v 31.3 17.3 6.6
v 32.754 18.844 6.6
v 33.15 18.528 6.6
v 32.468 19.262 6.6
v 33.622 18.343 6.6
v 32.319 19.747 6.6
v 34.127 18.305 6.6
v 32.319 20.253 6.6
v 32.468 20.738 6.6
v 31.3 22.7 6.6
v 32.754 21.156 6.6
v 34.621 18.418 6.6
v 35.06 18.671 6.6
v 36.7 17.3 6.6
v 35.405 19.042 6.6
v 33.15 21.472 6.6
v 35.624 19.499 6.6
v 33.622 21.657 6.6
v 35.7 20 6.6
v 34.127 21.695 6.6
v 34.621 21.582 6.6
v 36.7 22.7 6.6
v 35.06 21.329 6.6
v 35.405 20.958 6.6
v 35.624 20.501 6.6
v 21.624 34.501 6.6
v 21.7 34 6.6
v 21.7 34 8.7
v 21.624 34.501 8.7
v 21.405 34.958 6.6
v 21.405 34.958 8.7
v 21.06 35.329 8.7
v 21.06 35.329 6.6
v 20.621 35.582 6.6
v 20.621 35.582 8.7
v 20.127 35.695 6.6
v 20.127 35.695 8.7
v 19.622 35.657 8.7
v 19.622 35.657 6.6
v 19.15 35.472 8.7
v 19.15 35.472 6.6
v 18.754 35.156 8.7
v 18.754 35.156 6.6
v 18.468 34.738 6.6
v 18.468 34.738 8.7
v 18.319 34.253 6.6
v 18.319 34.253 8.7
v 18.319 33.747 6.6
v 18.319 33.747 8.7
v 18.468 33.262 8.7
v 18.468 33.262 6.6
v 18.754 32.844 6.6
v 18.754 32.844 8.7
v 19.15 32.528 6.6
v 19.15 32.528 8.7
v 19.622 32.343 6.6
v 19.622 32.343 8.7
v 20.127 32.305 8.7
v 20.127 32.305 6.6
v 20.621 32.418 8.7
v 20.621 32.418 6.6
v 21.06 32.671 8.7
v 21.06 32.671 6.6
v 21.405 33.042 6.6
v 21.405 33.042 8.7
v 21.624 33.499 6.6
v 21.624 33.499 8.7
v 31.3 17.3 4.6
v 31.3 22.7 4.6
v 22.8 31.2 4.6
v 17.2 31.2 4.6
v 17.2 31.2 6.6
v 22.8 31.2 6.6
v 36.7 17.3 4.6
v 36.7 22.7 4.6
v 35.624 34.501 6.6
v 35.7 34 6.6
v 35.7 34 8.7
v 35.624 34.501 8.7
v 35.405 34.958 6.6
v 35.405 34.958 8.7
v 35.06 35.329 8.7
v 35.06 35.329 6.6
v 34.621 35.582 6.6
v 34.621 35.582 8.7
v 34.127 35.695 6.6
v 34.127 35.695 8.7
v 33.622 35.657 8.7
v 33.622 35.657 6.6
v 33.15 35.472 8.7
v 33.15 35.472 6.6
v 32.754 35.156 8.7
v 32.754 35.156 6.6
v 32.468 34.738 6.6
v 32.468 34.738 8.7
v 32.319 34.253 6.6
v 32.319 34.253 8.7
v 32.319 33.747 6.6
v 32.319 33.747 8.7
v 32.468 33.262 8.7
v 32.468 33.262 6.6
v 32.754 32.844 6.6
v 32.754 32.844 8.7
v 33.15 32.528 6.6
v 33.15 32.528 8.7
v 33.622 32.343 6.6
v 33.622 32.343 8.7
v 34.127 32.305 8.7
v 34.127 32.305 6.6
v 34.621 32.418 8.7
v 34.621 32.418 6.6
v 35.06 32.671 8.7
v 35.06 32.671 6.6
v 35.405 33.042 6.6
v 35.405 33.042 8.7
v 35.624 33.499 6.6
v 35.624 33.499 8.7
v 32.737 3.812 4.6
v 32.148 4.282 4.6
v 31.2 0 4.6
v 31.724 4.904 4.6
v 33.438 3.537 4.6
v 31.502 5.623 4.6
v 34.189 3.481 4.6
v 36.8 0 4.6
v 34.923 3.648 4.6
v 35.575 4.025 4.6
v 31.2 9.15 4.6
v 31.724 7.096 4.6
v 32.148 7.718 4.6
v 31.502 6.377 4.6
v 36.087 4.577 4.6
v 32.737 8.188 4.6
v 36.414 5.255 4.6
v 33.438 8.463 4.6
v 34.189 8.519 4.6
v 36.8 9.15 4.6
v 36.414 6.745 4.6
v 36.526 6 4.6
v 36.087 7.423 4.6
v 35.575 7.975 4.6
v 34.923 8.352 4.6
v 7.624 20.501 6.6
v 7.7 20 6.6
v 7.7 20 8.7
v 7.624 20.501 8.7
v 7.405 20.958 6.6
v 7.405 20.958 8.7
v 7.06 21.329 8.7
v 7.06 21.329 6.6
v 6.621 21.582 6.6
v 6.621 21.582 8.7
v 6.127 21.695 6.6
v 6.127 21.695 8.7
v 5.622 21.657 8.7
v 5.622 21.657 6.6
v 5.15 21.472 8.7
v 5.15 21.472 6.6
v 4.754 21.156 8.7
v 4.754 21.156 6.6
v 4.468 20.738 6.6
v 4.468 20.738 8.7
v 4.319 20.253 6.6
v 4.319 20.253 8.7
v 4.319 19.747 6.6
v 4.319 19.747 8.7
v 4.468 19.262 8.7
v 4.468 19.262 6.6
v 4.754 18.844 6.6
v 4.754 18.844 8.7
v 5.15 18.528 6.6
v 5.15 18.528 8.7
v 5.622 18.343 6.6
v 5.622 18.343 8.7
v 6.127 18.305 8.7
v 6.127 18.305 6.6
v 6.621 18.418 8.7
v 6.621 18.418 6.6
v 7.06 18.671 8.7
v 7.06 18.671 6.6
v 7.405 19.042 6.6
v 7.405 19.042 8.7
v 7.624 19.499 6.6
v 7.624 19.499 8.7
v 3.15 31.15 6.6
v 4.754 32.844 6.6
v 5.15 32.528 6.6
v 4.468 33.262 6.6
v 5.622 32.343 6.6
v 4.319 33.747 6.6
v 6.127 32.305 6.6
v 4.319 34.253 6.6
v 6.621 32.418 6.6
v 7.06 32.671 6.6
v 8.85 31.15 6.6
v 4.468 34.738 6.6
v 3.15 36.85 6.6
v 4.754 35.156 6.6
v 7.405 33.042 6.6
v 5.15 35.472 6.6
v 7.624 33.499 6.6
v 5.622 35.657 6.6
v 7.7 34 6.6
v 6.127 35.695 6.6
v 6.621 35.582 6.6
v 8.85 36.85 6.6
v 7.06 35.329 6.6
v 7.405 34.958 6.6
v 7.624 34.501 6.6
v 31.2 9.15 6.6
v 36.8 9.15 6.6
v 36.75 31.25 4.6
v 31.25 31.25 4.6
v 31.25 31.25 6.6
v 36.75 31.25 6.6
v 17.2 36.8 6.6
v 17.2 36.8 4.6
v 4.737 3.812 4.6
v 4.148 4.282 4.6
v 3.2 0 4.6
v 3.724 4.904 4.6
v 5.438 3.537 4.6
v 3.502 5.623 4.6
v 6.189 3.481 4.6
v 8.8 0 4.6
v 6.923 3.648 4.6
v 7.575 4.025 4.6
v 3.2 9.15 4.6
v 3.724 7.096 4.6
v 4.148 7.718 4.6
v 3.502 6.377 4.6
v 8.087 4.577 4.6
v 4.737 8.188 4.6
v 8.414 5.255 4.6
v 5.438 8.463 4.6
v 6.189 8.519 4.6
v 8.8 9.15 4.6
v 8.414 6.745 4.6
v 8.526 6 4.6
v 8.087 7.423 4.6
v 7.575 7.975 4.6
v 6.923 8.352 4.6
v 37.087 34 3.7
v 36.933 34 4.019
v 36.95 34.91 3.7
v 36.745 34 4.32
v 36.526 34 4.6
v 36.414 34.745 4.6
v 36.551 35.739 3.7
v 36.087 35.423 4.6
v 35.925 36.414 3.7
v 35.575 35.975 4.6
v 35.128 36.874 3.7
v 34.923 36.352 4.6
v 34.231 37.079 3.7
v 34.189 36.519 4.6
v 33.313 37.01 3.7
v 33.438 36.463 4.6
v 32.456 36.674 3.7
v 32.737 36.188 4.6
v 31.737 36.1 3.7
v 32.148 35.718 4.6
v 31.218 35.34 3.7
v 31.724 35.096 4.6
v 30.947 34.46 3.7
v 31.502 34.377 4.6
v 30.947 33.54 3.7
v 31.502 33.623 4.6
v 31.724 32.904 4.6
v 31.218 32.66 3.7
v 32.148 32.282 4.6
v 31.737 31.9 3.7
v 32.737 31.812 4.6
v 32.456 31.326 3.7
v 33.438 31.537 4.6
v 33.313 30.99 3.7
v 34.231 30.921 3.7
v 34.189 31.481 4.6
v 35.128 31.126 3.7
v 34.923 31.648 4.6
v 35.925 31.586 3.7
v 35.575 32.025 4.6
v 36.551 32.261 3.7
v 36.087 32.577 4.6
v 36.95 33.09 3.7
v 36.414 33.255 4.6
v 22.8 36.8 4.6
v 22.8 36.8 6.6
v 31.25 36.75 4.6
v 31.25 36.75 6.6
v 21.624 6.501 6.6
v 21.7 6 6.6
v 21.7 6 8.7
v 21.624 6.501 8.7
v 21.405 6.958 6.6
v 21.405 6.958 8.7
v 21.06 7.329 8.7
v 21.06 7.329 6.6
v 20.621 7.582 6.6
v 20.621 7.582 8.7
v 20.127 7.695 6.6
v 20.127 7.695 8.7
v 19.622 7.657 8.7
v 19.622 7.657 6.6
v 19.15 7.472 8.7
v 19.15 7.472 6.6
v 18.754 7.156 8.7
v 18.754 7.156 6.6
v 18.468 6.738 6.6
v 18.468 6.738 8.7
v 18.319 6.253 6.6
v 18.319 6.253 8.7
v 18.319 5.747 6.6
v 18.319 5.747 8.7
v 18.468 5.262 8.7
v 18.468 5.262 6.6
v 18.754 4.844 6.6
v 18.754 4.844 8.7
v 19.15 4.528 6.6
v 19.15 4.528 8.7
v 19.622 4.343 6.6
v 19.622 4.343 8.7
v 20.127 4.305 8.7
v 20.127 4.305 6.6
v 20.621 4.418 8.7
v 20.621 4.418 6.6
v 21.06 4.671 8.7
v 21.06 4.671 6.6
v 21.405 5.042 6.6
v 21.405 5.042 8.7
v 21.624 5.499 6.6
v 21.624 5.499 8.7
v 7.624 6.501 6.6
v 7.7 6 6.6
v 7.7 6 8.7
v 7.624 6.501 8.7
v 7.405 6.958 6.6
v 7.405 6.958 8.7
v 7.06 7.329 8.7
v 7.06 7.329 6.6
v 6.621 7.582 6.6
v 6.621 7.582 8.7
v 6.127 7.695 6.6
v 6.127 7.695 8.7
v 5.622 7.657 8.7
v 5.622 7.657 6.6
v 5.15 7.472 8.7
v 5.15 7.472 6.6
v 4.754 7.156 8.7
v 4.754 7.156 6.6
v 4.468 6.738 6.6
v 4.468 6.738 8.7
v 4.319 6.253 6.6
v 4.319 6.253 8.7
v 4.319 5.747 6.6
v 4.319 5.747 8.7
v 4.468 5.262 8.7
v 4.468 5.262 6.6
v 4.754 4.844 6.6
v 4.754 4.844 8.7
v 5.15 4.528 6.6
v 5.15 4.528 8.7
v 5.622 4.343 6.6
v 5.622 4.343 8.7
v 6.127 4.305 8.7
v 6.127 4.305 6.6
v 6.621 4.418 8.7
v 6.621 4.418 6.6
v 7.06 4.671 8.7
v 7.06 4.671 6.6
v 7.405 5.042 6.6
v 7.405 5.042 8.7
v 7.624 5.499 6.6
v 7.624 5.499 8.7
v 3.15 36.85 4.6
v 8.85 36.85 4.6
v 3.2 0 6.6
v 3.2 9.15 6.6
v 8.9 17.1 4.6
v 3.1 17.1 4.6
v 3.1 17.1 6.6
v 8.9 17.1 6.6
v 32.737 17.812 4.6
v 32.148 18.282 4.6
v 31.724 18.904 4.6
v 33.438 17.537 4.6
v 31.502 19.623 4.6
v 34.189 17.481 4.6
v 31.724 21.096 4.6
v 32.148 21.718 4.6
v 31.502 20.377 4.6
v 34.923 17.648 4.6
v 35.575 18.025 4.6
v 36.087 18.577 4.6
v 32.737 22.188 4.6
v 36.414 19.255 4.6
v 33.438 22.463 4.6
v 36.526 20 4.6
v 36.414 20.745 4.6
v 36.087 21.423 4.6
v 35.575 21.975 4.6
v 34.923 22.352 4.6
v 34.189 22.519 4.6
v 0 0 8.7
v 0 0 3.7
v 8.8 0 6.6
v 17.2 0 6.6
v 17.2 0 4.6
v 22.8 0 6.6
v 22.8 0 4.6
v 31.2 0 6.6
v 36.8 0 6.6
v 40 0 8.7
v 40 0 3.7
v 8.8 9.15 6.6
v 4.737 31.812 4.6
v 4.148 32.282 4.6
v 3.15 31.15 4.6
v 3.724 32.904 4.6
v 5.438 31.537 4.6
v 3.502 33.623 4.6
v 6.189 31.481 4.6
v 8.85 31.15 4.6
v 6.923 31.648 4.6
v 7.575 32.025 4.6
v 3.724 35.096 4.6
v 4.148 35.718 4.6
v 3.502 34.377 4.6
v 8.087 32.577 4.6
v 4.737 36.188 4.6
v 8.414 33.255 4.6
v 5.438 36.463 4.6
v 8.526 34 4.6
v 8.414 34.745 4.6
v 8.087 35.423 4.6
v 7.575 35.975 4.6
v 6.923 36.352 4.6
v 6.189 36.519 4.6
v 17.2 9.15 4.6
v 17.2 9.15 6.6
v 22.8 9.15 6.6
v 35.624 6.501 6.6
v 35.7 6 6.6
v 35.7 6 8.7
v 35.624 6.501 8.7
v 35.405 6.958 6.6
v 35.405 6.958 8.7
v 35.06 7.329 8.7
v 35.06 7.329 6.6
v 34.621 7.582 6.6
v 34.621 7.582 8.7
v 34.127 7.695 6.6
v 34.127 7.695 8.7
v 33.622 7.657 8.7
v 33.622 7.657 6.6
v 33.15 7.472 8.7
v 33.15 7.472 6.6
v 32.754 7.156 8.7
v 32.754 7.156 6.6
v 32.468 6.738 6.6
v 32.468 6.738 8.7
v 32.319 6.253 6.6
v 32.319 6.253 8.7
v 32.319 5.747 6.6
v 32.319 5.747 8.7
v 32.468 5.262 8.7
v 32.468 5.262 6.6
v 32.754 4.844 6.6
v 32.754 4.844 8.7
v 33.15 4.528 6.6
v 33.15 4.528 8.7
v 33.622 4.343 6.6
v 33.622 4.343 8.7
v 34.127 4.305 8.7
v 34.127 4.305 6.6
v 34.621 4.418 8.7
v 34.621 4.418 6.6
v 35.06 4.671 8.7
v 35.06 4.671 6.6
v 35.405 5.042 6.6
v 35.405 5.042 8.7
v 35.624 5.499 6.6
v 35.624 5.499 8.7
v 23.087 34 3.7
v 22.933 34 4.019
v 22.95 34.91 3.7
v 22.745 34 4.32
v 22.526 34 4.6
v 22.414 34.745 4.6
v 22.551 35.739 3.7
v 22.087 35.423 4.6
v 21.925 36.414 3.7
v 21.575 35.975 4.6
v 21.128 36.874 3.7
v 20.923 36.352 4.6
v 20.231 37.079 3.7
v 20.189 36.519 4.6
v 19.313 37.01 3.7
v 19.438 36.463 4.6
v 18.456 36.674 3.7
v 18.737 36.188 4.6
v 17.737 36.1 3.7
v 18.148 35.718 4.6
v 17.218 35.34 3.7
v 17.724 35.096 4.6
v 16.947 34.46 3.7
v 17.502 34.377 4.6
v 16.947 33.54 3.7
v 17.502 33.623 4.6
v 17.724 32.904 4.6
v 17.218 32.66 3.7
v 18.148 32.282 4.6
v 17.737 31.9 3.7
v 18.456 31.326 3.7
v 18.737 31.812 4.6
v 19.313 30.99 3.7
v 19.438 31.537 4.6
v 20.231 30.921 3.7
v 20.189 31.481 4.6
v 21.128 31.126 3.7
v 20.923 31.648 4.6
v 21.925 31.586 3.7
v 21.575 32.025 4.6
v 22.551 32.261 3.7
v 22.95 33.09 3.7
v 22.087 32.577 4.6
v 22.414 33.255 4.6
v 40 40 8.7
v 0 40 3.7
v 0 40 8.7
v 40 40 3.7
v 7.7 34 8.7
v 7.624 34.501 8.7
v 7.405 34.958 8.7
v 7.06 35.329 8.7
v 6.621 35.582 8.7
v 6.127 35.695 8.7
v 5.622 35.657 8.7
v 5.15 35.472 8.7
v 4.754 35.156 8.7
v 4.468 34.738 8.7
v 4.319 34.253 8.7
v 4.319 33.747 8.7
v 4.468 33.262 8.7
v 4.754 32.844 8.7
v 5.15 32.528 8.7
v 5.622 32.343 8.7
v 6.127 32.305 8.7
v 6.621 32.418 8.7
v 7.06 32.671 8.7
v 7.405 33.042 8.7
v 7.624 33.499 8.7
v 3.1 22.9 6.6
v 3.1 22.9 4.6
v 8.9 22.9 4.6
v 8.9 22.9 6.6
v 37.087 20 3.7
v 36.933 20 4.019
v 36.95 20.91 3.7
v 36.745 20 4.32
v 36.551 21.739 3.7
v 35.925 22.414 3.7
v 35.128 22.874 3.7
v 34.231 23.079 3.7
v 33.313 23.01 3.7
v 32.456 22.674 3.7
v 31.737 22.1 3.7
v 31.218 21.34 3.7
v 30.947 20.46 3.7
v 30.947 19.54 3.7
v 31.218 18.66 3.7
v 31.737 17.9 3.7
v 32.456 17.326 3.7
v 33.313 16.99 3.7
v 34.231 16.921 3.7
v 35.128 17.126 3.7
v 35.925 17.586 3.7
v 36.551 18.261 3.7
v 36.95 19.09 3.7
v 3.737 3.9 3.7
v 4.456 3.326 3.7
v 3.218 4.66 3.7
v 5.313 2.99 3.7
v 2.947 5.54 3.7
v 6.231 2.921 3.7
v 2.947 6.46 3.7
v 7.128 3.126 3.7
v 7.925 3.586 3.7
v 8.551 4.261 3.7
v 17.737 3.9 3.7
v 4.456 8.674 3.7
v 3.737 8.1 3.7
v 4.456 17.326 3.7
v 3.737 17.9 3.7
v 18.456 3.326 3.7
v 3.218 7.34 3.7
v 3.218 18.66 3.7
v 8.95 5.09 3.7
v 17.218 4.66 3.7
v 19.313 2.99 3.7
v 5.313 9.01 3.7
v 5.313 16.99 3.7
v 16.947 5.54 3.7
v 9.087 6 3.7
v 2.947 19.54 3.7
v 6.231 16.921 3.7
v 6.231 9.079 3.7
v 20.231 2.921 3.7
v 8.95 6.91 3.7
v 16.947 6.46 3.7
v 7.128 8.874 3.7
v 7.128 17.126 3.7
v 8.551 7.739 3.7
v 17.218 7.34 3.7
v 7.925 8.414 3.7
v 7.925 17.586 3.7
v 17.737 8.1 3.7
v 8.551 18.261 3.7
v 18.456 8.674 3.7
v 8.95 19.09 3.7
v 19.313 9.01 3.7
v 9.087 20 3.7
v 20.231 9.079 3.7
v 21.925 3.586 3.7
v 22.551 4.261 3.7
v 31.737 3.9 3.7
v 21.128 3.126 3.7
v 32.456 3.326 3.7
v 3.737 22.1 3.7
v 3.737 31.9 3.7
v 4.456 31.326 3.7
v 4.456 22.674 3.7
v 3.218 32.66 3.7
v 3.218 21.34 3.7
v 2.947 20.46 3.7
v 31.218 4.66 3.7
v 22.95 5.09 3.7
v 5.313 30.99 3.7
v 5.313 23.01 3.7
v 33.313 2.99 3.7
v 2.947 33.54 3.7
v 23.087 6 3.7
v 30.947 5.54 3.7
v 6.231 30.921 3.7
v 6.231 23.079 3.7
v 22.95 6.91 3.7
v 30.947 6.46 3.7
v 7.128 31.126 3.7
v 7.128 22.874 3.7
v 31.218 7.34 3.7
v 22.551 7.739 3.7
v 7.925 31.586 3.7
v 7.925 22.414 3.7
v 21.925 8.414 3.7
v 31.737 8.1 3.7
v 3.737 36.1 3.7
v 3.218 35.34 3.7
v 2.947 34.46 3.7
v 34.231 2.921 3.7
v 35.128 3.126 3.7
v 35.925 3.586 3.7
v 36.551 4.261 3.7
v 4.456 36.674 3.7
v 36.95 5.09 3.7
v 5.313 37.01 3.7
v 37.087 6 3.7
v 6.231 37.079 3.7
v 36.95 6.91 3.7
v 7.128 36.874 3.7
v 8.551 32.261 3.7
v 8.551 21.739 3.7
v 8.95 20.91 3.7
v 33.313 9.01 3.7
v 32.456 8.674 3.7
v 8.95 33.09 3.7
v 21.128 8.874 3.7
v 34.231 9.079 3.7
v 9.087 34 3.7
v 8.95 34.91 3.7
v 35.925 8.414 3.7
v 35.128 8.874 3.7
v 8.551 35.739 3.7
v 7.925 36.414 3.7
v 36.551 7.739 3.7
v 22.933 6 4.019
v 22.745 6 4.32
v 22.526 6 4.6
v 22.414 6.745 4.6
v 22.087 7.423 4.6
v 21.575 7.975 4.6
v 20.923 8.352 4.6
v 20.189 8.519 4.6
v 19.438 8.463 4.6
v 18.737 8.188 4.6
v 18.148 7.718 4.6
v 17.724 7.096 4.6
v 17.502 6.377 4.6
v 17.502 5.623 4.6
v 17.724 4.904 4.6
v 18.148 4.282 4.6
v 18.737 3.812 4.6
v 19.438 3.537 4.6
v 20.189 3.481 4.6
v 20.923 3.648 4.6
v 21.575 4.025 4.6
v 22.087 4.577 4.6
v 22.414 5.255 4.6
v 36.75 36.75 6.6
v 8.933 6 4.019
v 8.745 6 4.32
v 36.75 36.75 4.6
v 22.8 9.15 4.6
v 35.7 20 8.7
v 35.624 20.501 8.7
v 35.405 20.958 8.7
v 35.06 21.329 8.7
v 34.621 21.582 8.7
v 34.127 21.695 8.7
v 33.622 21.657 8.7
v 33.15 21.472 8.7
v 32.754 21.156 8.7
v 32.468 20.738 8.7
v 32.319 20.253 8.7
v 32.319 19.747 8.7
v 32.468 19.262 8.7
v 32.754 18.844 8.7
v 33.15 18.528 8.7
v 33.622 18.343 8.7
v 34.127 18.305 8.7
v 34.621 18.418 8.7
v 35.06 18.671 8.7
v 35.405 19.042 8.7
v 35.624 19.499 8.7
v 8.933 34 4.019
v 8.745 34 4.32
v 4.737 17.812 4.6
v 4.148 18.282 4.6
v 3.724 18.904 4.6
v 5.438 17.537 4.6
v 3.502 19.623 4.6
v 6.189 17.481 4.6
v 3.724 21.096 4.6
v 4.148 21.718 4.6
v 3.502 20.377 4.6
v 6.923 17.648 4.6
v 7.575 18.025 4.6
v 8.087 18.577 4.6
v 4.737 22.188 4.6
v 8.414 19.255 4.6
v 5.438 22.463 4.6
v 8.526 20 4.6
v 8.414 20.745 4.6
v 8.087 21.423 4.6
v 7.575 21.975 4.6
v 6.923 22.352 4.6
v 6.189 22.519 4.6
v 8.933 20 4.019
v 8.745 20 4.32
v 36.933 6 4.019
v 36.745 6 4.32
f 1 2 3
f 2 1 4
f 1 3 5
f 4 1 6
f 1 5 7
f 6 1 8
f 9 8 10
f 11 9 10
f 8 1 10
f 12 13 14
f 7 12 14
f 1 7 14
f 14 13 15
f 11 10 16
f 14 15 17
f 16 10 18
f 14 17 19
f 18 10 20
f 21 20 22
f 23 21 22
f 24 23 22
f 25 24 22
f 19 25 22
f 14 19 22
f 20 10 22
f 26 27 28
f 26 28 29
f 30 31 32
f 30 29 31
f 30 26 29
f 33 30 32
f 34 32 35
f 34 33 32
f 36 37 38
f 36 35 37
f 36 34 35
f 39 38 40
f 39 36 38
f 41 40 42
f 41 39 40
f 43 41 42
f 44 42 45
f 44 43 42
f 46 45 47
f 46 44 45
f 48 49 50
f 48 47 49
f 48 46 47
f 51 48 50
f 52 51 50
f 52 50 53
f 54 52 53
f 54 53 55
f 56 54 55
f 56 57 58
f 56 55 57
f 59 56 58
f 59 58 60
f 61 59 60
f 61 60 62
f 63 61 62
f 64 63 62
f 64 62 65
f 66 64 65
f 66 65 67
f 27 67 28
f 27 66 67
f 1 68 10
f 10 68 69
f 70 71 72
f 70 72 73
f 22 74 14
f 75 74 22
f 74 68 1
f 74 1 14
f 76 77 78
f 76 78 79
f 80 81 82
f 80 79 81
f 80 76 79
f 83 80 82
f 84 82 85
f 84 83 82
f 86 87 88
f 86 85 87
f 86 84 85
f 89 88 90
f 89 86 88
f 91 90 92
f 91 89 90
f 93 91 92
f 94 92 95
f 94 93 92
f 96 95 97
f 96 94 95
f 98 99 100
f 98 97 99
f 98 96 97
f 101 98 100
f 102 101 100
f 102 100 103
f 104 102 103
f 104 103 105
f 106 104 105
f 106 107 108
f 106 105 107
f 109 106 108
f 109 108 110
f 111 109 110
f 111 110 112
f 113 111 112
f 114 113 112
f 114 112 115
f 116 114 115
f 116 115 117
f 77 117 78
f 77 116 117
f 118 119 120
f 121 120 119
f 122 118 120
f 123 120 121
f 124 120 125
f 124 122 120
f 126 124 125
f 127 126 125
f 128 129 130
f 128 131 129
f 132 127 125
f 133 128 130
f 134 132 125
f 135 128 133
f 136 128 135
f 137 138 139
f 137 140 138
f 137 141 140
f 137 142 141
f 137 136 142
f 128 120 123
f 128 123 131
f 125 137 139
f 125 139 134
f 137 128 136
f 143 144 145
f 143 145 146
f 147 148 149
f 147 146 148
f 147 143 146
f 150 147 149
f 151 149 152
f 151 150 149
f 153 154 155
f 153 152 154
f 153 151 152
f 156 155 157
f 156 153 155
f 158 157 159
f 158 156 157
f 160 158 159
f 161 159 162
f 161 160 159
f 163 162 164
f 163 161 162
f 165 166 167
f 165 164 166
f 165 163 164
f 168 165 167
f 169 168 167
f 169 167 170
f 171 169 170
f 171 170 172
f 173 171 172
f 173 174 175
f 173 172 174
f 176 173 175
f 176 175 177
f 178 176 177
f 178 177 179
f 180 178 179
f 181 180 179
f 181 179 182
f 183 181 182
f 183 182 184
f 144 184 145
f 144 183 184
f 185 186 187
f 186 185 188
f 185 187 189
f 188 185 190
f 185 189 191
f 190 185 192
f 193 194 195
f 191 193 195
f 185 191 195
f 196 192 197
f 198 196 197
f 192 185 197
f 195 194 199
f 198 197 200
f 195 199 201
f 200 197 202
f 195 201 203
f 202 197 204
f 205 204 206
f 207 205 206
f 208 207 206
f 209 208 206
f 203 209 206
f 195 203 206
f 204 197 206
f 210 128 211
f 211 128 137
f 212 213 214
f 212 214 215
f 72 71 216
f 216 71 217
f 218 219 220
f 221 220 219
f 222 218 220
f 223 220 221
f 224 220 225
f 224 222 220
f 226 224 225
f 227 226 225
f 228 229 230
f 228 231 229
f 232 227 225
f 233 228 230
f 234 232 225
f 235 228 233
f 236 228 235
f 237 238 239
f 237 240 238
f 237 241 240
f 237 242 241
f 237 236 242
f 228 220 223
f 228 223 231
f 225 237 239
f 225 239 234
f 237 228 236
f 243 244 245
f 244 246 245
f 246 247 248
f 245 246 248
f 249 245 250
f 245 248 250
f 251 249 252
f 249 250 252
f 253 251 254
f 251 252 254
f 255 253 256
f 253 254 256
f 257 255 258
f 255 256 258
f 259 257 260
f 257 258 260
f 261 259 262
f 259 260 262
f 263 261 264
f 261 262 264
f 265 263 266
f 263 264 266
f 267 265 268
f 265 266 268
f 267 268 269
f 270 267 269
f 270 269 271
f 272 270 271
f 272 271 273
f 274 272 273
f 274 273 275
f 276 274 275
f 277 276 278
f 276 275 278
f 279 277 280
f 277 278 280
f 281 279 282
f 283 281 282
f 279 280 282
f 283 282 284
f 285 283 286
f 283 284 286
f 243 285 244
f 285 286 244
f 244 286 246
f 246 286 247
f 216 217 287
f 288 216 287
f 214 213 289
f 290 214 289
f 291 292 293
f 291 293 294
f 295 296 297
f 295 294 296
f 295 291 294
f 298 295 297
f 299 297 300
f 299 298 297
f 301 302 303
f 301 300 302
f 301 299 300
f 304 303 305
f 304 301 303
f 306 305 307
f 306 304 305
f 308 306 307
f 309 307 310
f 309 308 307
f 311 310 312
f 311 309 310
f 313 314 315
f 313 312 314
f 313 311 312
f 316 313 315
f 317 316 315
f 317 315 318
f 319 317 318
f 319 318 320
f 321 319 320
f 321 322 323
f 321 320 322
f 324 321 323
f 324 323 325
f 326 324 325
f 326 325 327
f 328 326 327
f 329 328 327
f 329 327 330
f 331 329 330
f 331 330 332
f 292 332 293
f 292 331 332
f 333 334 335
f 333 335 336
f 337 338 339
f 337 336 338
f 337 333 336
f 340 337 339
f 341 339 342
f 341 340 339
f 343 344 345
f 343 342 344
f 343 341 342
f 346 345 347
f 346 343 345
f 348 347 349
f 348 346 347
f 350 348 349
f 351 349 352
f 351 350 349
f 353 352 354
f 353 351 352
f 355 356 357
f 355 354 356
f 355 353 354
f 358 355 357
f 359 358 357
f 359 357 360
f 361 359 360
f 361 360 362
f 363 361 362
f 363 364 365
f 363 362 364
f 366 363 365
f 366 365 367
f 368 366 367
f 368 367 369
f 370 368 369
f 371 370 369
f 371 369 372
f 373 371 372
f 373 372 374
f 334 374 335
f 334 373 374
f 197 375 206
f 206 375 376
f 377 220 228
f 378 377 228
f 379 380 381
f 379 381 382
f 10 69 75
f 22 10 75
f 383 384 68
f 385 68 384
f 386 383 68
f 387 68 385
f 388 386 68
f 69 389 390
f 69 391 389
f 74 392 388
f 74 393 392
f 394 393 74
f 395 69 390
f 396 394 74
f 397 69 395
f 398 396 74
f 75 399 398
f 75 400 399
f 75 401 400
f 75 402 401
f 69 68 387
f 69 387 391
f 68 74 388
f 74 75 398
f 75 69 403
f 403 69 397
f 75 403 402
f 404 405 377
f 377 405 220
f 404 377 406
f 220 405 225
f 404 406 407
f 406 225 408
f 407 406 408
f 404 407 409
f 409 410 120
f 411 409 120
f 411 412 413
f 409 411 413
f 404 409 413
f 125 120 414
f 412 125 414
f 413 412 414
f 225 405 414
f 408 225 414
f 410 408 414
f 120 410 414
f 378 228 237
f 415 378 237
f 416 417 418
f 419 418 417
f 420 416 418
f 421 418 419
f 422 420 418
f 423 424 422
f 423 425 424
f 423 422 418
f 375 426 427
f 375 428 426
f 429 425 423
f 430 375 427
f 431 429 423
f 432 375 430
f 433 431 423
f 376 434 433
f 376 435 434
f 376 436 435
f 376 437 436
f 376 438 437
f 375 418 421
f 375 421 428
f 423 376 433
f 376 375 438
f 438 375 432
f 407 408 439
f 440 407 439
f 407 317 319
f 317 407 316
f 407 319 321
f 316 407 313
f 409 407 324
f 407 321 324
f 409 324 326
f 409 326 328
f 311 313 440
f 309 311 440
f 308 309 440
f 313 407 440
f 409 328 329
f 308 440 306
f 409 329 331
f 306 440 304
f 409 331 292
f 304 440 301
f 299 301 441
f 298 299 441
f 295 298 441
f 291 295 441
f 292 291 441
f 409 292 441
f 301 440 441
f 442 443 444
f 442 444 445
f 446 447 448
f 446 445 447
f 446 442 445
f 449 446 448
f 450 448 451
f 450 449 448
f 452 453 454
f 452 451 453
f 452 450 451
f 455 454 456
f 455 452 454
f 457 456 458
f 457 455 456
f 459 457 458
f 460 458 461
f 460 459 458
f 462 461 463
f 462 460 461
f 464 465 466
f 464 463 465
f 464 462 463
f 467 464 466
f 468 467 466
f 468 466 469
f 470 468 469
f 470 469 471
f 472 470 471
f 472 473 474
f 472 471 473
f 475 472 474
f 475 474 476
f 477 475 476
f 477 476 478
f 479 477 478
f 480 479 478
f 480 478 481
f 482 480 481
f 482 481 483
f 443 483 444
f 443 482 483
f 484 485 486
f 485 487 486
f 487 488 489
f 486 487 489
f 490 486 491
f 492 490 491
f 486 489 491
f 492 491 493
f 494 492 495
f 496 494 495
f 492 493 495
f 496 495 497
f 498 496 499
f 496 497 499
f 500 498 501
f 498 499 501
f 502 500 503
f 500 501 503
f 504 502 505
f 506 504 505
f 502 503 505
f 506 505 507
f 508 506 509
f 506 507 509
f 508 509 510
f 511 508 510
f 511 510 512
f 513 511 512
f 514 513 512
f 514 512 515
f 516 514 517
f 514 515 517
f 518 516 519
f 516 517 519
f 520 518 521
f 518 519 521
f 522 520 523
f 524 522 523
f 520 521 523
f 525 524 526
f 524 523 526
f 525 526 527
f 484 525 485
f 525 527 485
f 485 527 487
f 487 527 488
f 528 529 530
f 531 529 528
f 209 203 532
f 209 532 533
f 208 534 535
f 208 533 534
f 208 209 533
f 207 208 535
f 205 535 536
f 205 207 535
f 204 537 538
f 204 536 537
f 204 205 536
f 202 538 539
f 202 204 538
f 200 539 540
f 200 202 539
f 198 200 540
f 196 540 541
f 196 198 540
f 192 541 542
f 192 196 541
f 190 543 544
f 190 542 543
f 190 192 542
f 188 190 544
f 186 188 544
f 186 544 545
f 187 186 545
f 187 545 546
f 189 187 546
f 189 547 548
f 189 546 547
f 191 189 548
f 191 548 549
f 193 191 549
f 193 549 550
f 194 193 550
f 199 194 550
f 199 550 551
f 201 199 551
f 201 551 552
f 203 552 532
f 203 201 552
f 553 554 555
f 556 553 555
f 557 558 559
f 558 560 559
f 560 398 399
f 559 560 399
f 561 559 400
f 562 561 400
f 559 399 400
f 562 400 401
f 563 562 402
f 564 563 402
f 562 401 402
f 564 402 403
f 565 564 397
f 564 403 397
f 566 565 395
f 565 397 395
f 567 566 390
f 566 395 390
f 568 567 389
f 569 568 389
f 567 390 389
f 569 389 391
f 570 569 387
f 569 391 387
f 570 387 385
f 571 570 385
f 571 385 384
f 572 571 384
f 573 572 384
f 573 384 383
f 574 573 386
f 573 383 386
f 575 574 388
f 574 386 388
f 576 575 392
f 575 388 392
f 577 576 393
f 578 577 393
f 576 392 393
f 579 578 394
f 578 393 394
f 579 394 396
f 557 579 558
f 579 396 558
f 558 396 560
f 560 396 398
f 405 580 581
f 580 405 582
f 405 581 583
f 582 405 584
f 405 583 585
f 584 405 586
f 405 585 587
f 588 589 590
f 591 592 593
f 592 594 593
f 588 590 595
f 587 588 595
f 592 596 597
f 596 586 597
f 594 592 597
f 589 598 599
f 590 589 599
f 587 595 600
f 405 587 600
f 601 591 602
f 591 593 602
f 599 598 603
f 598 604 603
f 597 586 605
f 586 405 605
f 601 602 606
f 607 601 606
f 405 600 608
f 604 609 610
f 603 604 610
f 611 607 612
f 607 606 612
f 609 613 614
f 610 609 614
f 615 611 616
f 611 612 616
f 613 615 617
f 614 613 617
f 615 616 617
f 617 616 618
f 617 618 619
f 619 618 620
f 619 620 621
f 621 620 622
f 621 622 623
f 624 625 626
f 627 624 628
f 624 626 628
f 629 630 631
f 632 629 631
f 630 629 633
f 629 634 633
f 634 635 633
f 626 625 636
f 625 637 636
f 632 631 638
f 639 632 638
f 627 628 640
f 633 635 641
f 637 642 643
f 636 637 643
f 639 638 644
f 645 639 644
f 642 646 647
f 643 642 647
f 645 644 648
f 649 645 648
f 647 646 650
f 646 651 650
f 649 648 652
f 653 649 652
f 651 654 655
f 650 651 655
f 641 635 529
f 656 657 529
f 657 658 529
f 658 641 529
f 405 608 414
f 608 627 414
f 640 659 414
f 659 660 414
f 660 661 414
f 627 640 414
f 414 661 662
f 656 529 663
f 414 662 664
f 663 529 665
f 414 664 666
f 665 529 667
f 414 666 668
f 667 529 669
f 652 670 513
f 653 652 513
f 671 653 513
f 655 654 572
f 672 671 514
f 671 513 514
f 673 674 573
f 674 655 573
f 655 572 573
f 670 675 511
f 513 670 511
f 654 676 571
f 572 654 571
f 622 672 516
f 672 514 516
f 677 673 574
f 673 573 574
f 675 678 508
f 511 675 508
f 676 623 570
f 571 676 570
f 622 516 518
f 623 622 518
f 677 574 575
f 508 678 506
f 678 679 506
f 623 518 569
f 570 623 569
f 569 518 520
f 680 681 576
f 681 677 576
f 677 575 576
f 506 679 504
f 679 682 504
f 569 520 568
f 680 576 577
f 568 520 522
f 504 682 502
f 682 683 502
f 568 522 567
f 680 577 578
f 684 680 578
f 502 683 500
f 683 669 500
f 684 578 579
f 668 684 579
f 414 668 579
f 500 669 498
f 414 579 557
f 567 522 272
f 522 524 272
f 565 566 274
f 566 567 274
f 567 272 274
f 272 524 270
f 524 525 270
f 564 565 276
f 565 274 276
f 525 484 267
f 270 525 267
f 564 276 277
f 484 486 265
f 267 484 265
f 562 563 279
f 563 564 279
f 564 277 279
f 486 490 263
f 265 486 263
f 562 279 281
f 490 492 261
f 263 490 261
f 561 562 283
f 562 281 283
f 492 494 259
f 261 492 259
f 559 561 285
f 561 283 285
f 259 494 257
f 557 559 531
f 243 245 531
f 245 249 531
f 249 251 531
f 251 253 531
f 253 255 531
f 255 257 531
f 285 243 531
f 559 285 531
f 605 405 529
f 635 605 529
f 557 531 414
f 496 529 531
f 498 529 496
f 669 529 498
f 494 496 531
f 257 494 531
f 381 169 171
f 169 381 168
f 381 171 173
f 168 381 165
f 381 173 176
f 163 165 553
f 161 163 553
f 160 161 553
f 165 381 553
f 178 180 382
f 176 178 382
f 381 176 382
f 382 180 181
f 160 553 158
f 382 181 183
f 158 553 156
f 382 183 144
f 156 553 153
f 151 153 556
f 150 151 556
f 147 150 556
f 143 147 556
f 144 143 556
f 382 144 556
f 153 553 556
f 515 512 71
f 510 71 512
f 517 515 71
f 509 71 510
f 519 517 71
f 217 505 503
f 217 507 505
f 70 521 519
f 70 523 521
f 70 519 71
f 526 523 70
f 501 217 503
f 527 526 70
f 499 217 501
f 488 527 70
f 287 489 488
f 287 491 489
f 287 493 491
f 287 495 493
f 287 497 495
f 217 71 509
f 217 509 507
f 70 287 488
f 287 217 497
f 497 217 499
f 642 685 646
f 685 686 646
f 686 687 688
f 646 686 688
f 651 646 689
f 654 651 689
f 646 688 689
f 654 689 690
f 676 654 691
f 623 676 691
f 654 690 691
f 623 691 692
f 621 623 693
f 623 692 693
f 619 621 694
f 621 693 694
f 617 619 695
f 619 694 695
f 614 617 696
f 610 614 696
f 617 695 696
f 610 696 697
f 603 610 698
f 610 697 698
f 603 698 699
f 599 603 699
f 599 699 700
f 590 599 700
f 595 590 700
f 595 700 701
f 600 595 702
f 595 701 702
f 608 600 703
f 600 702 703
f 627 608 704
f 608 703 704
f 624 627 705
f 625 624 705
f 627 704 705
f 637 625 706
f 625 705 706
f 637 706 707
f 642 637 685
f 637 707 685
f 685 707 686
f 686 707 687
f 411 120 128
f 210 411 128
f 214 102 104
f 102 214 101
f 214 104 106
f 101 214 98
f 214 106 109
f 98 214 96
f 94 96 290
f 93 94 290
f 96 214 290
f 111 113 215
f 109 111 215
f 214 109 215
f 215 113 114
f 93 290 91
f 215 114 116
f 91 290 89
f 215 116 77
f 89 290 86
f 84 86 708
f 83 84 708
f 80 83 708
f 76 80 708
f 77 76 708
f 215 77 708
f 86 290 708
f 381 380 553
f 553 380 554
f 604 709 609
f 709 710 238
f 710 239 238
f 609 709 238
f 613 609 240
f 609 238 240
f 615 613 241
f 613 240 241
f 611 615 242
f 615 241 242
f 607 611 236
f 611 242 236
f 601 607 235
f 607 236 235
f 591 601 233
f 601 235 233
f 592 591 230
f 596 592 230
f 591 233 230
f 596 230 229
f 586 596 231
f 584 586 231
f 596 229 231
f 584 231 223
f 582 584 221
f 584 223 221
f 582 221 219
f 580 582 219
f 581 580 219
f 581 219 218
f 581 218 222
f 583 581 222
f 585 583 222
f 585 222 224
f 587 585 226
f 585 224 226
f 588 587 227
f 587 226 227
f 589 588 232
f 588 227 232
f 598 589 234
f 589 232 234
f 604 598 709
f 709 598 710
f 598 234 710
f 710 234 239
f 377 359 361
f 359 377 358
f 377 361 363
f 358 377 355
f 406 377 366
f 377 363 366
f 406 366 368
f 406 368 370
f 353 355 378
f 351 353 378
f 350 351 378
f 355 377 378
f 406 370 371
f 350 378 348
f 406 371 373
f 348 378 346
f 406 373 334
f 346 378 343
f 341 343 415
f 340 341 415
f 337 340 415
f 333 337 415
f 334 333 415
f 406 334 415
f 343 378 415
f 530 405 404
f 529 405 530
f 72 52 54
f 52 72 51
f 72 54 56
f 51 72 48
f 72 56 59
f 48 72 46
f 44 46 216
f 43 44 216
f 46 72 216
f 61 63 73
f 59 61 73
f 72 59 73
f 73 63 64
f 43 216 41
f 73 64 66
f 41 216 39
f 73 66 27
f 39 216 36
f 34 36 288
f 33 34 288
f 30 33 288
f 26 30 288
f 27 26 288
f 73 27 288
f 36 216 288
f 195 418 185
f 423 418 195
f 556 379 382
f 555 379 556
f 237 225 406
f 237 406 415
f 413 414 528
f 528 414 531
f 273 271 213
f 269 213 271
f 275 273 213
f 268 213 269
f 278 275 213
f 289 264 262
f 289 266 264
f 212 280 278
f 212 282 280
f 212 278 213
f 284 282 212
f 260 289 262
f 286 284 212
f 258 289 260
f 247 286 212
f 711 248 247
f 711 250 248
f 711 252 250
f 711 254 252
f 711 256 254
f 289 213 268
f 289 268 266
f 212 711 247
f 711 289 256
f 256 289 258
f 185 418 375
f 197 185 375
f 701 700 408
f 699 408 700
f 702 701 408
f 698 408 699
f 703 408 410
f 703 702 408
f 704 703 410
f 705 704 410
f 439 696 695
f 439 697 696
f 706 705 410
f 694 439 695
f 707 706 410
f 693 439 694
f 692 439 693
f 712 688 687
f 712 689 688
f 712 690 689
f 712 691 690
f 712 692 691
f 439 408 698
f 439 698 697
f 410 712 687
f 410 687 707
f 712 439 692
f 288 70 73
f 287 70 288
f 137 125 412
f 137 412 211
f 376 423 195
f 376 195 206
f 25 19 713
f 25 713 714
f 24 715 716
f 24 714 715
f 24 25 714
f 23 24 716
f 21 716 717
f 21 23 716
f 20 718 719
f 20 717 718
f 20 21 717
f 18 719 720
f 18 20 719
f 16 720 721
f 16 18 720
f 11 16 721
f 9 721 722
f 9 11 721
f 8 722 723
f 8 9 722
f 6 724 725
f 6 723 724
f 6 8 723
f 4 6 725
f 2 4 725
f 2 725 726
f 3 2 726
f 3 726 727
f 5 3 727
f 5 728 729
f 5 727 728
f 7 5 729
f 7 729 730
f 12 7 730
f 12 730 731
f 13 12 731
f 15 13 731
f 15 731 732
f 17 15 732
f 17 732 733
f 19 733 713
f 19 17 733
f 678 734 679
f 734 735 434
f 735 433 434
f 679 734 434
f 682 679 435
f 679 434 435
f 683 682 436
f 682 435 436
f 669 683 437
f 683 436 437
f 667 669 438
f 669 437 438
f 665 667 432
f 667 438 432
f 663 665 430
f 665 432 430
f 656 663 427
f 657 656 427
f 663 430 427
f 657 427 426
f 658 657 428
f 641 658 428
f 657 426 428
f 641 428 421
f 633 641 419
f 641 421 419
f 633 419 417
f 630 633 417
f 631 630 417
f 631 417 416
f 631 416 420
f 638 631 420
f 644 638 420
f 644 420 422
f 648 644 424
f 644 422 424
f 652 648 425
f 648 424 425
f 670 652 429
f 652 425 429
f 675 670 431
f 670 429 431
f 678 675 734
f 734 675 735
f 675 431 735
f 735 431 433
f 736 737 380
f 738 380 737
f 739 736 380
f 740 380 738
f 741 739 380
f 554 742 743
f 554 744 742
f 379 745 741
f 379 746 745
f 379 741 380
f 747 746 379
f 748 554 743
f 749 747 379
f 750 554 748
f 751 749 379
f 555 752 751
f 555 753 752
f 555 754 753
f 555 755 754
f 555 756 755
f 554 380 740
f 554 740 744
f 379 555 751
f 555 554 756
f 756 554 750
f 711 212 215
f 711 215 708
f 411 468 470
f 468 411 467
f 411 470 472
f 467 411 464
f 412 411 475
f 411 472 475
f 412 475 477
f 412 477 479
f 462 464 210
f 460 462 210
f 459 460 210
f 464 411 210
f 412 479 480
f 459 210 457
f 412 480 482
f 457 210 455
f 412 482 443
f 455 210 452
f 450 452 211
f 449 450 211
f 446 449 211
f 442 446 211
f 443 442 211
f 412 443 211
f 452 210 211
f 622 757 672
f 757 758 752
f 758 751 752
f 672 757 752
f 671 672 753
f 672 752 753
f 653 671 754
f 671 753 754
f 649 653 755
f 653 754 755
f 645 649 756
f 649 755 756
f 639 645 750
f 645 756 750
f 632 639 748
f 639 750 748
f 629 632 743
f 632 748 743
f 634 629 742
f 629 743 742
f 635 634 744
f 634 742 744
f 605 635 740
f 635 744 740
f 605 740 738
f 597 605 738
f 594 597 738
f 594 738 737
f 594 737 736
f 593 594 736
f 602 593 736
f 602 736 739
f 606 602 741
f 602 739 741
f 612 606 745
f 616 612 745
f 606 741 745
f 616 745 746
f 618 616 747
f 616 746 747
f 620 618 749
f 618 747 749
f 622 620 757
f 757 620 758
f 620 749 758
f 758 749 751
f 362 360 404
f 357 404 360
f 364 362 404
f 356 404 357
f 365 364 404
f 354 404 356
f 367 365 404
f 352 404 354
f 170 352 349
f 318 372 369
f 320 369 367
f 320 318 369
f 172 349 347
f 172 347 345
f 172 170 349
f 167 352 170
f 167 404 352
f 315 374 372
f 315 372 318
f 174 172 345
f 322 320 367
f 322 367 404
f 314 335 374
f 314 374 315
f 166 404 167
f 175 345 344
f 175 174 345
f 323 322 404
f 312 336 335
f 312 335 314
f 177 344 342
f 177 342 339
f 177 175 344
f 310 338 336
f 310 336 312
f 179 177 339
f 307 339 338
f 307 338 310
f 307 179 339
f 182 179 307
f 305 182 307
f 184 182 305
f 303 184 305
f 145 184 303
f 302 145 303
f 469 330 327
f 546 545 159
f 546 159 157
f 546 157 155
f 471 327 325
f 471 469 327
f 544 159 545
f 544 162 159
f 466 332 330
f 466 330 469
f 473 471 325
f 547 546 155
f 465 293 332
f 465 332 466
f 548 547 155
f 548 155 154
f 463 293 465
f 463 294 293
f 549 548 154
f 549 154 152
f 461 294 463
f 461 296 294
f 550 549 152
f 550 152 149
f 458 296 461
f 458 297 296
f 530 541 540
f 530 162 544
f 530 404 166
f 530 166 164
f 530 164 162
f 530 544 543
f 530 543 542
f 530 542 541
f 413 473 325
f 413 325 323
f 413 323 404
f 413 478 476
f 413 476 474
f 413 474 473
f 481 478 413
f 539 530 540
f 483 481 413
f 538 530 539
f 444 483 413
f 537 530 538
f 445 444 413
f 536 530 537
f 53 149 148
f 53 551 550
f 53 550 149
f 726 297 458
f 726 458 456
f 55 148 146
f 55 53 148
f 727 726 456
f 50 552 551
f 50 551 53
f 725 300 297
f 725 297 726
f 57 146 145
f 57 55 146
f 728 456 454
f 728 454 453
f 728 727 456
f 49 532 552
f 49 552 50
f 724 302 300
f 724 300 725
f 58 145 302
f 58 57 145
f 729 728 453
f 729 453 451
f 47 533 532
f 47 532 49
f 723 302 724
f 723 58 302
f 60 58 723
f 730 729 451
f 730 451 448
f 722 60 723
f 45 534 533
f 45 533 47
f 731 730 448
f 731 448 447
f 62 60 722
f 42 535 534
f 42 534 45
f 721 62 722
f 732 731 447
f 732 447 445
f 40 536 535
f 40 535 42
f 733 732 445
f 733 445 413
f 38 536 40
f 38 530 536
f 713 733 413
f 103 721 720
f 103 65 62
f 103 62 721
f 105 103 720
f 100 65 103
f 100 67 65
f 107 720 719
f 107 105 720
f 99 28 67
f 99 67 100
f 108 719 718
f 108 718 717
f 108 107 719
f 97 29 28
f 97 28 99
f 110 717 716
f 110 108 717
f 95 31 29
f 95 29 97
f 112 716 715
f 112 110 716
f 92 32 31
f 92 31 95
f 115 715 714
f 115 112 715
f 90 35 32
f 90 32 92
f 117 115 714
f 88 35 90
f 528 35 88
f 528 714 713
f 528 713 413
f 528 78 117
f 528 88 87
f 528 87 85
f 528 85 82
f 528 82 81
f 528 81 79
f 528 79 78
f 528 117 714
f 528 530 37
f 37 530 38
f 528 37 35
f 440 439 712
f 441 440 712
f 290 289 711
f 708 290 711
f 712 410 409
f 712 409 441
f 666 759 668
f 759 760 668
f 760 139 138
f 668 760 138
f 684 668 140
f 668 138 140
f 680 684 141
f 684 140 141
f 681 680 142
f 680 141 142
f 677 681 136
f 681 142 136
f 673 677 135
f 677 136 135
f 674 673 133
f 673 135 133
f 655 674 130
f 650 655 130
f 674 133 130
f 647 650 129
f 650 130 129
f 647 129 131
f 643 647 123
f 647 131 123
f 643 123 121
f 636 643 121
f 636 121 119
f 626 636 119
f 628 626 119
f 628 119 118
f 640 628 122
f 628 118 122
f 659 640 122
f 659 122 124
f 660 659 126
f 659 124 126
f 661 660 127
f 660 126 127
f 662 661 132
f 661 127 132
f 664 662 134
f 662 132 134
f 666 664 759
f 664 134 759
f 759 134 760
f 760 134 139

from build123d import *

# Parameters (mm, degrees)
CYLINDER004_R     = 1.7
CYLINDER004_DEPTH = 10
CYLINDER007_R     = 1.7
CYLINDER007_DEPTH = 10
CYLINDER005_R     = 1.7
CYLINDER005_DEPTH = 10
CYLINDER006_R     = 1.7
CYLINDER006_DEPTH = 10
CYLINDER001_R     = 1.7
CYLINDER001_DEPTH = 10
CYLINDER002_R     = 1.7
CYLINDER002_DEPTH = 10
CYLINDER003_R     = 1.7
CYLINDER003_DEPTH = 10
CYLINDER_R        = 1.7
CYLINDER_DEPTH    = 10
BOX065_W          = 5.8
BOX065_H          = 5.8
BOX065_DEPTH      = 2
BOX062_W          = 5.4
BOX062_H          = 5.4
BOX062_DEPTH      = 2
BOX063_W          = 5.7
BOX063_H          = 5.7
BOX063_DEPTH      = 2
BOX064_W          = 5.5
BOX064_H          = 5.5
BOX064_DEPTH      = 2
BOX066_W          = 5.6
BOX066_H          = 10
BOX066_DEPTH      = 2
BOX059_W          = 5.6
BOX059_H          = 5.6
BOX059_DEPTH      = 2
BOX060_W          = 5.6
BOX060_H          = 10
BOX060_DEPTH      = 2
BOX061_W          = 5.6
BOX061_H          = 10
BOX061_DEPTH      = 2
BOX058_W          = 40
BOX058_H          = 40
BOX058_DEPTH      = 5


with BuildPart() as cylinder004:
    # Cylinder004 → Cylinder004 (new body)
    with BuildSketch(Plane(origin=(20, 34, 0), x_dir=(1, 0, 0), z_dir=(0, 0, 1))):
        Circle(CYLINDER004_R)
    extrude(amount=CYLINDER004_DEPTH)


with BuildPart() as cylinder007:
    # Cylinder007 → Cylinder007 (new body)
    with BuildSketch(Plane(origin=(34, 20, 0), x_dir=(1, 0, 0), z_dir=(0, 0, 1))):
        Circle(CYLINDER007_R)
    extrude(amount=CYLINDER007_DEPTH)


with BuildPart() as cylinder005:
    # Cylinder005 → Cylinder005 (new body)
    with BuildSketch(Plane(origin=(6, 34, 0), x_dir=(1, 0, 0), z_dir=(0, 0, 1))):
        Circle(CYLINDER005_R)
    extrude(amount=CYLINDER005_DEPTH)


with BuildPart() as cylinder006:
    # Cylinder006 → Cylinder006 (new body)
    with BuildSketch(Plane(origin=(6, 20, 0), x_dir=(1, 0, 0), z_dir=(0, 0, 1))):
        Circle(CYLINDER006_R)
    extrude(amount=CYLINDER006_DEPTH)


with BuildPart() as cylinder001:
    # Cylinder001 → Cylinder001 (new body)
    with BuildSketch(Plane(origin=(20, 6, 0), x_dir=(1, 0, 0), z_dir=(0, 0, 1))):
        Circle(CYLINDER001_R)
    extrude(amount=CYLINDER001_DEPTH)


with BuildPart() as cylinder002:
    # Cylinder002 → Cylinder002 (new body)
    with BuildSketch(Plane(origin=(34, 6, 0), x_dir=(1, 0, 0), z_dir=(0, 0, 1))):
        Circle(CYLINDER002_R)
    extrude(amount=CYLINDER002_DEPTH)


with BuildPart() as cylinder003:
    # Cylinder003 → Cylinder003 (new body)
    with BuildSketch(Plane(origin=(34, 34, 0), x_dir=(1, 0, 0), z_dir=(0, 0, 1))):
        Circle(CYLINDER003_R)
    extrude(amount=CYLINDER003_DEPTH)


with BuildPart() as fusion018:
    # Cylinder → Cylinder (new body)
    with BuildSketch(Plane(origin=(6, 6, 0), x_dir=(1, 0, 0), z_dir=(0, 0, 1))):
        Circle(CYLINDER_R)
    extrude(amount=CYLINDER_DEPTH)

    # Fusion018: union Cylinder004, Cylinder007, Cylinder005, Cylinder006, Cylinder001, Cylinder002, Cylinder003
    add(cylinder004.part)
    add(cylinder007.part)
    add(cylinder005.part)
    add(cylinder006.part)
    add(cylinder001.part)
    add(cylinder002.part)
    add(cylinder003.part)


with BuildPart() as sphere024:
    # Sphere024 → Sphere024 (revolve)
    with BuildSketch(Plane(origin=(6, 34, 2.4), x_dir=(1, 0, 0), z_dir=(0, -1, 0))):
        with BuildLine():
            ThreePointArc((0, -3.35), (3.35, 0), (0, 3.35))
            Line((0, 3.35), (0, -3.35))
        make_face()
    revolve(axis=Axis((6, 34, 2.4), (0, 0, 1)))


with BuildPart() as nut_clearence1:
    # Sphere006 → Sphere006 (revolve)
    with BuildSketch(Plane(origin=(6, 6, 2.4), x_dir=(1, 0, 0), z_dir=(0, -1, 0))):
        with BuildLine():
            ThreePointArc((0, -3.35), (3.35, 0), (0, 3.35))
            Line((0, 3.35), (0, -3.35))
        make_face()
    revolve(axis=Axis((6, 6, 2.4), (0, 0, 1)))


with BuildPart() as sphere025:
    # Sphere025 → Sphere025 (revolve)
    with BuildSketch(Plane(origin=(20, 6, 2.4), x_dir=(1, 0, 0), z_dir=(0, -1, 0))):
        with BuildLine():
            ThreePointArc((0, -3.35), (3.35, 0), (0, 3.35))
            Line((0, 3.35), (0, -3.35))
        make_face()
    revolve(axis=Axis((20, 6, 2.4), (0, 0, 1)))


with BuildPart() as sphere001:
    # Sphere001 → Sphere001 (revolve)
    with BuildSketch(Plane(origin=(34, 6, 2.4), x_dir=(1, 0, 0), z_dir=(0, -1, 0))):
        with BuildLine():
            ThreePointArc((0, -3.35), (3.35, 0), (0, 3.35))
            Line((0, 3.35), (0, -3.35))
        make_face()
    revolve(axis=Axis((34, 6, 2.4), (0, 0, 1)))


with BuildPart() as sphere026:
    # Sphere026 → Sphere026 (revolve)
    with BuildSketch(Plane(origin=(20, 34, 2.4), x_dir=(1, 0, 0), z_dir=(0, -1, 0))):
        with BuildLine():
            ThreePointArc((0, -3.35), (3.35, 0), (0, 3.35))
            Line((0, 3.35), (0, -3.35))
        make_face()
    revolve(axis=Axis((20, 34, 2.4), (0, 0, 1)))


with BuildPart() as sphere004:
    # Sphere004 → Sphere004 (revolve)
    with BuildSketch(Plane(origin=(6, 20, 2.4), x_dir=(1, 0, 0), z_dir=(0, -1, 0))):
        with BuildLine():
            ThreePointArc((0, -3.35), (3.35, 0), (0, 3.35))
            Line((0, 3.35), (0, -3.35))
        make_face()
    revolve(axis=Axis((6, 20, 2.4), (0, 0, 1)))


with BuildPart() as sphere002:
    # Sphere002 → Sphere002 (revolve)
    with BuildSketch(Plane(origin=(34, 34, 2.4), x_dir=(1, 0, 0), z_dir=(0, -1, 0))):
        with BuildLine():
            ThreePointArc((0, -3.35), (3.35, 0), (0, 3.35))
            Line((0, 3.35), (0, -3.35))
        make_face()
    revolve(axis=Axis((34, 34, 2.4), (0, 0, 1)))


with BuildPart() as fusion019:
    # Sphere007 → Sphere007 (revolve)
    with BuildSketch(Plane(origin=(34, 20, 2.4), x_dir=(1, 0, 0), z_dir=(0, -1, 0))):
        with BuildLine():
            ThreePointArc((0, -3.35), (3.35, 0), (0, 3.35))
            Line((0, 3.35), (0, -3.35))
        make_face()
    revolve(axis=Axis((34, 20, 2.4), (0, 0, 1)))

    # Fusion019: union Sphere024, Nut Clearence1, Sphere025, Sphere001, Sphere026, Sphere004, Sphere002
    add(sphere024.part)
    add(nut_clearence1.part)
    add(sphere025.part)
    add(sphere001.part)
    add(sphere026.part)
    add(sphere004.part)
    add(sphere002.part)


with BuildPart() as box065:
    # Box065 → Box065 (new body)
    with BuildSketch(Plane(origin=(3.1, 17.1, 4.6), x_dir=(1, 0, 0), z_dir=(0, 0, 1))):
        with Locations((2.9, 2.9)):
            Rectangle(BOX065_W, BOX065_H)
    extrude(amount=BOX065_DEPTH)


with BuildPart() as box062:
    # Box062 → Box062 (new body)
    with BuildSketch(Plane(origin=(31.3, 17.3, 4.6), x_dir=(1, 0, 0), z_dir=(0, 0, 1))):
        with Locations((2.7, 2.7)):
            Rectangle(BOX062_W, BOX062_H)
    extrude(amount=BOX062_DEPTH)


with BuildPart() as box063:
    # Box063 → Box063 (new body)
    with BuildSketch(Plane(origin=(3.15, 31.15, 4.6), x_dir=(1, 0, 0), z_dir=(0, 0, 1))):
        with Locations((2.85, 2.85)):
            Rectangle(BOX063_W, BOX063_H)
    extrude(amount=BOX063_DEPTH)


with BuildPart() as box064:
    # Box064 → Box064 (new body)
    with BuildSketch(Plane(origin=(31.25, 31.25, 4.6), x_dir=(1, 0, 0), z_dir=(0, 0, 1))):
        with Locations((2.75, 2.75)):
            Rectangle(BOX064_W, BOX064_H)
    extrude(amount=BOX064_DEPTH)


with BuildPart() as box066:
    # Box066 → Box066 (new body)
    with BuildSketch(Plane(origin=(3.2, -0.85, 4.6), x_dir=(1, 0, 0), z_dir=(0, 0, 1))):
        with Locations((2.8, 5)):
            Rectangle(BOX066_W, BOX066_H)
    extrude(amount=BOX066_DEPTH)


with BuildPart() as box059:
    # Box059 → Box059 (new body)
    with BuildSketch(Plane(origin=(17.2, 31.2, 4.6), x_dir=(1, 0, 0), z_dir=(0, 0, 1))):
        with Locations((2.8, 2.8)):
            Rectangle(BOX059_W, BOX059_H)
    extrude(amount=BOX059_DEPTH)


with BuildPart() as box060:
    # Box060 → Box060 (new body)
    with BuildSketch(Plane(origin=(17.2, -0.85, 4.6), x_dir=(1, 0, 0), z_dir=(0, 0, 1))):
        with Locations((2.8, 5)):
            Rectangle(BOX060_W, BOX060_H)
    extrude(amount=BOX060_DEPTH)


with BuildPart() as fusion020:
    # Box061 → Box061 (new body)
    with BuildSketch(Plane(origin=(31.2, -0.85, 4.6), x_dir=(1, 0, 0), z_dir=(0, 0, 1))):
        with Locations((2.8, 5)):
            Rectangle(BOX061_W, BOX061_H)
    extrude(amount=BOX061_DEPTH)

    # Fusion020: union Box065, Box062, Box063, Box064, Box066, Box059, Box060
    add(box065.part)
    add(box062.part)
    add(box063.part)
    add(box064.part)
    add(box066.part)
    add(box059.part)
    add(box060.part)


with BuildPart() as cut018:
    # Box058 → Box058 (new body)
    with BuildSketch(Plane.XY.offset(3.7)):
        with Locations((20, 20)):
            Rectangle(BOX058_W, BOX058_H)
    extrude(amount=BOX058_DEPTH)

    # Cut017: cut Fusion020
    add(fusion020.part, mode=Mode.SUBTRACT)

    # Cut019: cut Fusion019
    add(fusion019.part, mode=Mode.SUBTRACT)

    # Cut018: cut Fusion018
    add(fusion018.part, mode=Mode.SUBTRACT)


solid = cut018.part
